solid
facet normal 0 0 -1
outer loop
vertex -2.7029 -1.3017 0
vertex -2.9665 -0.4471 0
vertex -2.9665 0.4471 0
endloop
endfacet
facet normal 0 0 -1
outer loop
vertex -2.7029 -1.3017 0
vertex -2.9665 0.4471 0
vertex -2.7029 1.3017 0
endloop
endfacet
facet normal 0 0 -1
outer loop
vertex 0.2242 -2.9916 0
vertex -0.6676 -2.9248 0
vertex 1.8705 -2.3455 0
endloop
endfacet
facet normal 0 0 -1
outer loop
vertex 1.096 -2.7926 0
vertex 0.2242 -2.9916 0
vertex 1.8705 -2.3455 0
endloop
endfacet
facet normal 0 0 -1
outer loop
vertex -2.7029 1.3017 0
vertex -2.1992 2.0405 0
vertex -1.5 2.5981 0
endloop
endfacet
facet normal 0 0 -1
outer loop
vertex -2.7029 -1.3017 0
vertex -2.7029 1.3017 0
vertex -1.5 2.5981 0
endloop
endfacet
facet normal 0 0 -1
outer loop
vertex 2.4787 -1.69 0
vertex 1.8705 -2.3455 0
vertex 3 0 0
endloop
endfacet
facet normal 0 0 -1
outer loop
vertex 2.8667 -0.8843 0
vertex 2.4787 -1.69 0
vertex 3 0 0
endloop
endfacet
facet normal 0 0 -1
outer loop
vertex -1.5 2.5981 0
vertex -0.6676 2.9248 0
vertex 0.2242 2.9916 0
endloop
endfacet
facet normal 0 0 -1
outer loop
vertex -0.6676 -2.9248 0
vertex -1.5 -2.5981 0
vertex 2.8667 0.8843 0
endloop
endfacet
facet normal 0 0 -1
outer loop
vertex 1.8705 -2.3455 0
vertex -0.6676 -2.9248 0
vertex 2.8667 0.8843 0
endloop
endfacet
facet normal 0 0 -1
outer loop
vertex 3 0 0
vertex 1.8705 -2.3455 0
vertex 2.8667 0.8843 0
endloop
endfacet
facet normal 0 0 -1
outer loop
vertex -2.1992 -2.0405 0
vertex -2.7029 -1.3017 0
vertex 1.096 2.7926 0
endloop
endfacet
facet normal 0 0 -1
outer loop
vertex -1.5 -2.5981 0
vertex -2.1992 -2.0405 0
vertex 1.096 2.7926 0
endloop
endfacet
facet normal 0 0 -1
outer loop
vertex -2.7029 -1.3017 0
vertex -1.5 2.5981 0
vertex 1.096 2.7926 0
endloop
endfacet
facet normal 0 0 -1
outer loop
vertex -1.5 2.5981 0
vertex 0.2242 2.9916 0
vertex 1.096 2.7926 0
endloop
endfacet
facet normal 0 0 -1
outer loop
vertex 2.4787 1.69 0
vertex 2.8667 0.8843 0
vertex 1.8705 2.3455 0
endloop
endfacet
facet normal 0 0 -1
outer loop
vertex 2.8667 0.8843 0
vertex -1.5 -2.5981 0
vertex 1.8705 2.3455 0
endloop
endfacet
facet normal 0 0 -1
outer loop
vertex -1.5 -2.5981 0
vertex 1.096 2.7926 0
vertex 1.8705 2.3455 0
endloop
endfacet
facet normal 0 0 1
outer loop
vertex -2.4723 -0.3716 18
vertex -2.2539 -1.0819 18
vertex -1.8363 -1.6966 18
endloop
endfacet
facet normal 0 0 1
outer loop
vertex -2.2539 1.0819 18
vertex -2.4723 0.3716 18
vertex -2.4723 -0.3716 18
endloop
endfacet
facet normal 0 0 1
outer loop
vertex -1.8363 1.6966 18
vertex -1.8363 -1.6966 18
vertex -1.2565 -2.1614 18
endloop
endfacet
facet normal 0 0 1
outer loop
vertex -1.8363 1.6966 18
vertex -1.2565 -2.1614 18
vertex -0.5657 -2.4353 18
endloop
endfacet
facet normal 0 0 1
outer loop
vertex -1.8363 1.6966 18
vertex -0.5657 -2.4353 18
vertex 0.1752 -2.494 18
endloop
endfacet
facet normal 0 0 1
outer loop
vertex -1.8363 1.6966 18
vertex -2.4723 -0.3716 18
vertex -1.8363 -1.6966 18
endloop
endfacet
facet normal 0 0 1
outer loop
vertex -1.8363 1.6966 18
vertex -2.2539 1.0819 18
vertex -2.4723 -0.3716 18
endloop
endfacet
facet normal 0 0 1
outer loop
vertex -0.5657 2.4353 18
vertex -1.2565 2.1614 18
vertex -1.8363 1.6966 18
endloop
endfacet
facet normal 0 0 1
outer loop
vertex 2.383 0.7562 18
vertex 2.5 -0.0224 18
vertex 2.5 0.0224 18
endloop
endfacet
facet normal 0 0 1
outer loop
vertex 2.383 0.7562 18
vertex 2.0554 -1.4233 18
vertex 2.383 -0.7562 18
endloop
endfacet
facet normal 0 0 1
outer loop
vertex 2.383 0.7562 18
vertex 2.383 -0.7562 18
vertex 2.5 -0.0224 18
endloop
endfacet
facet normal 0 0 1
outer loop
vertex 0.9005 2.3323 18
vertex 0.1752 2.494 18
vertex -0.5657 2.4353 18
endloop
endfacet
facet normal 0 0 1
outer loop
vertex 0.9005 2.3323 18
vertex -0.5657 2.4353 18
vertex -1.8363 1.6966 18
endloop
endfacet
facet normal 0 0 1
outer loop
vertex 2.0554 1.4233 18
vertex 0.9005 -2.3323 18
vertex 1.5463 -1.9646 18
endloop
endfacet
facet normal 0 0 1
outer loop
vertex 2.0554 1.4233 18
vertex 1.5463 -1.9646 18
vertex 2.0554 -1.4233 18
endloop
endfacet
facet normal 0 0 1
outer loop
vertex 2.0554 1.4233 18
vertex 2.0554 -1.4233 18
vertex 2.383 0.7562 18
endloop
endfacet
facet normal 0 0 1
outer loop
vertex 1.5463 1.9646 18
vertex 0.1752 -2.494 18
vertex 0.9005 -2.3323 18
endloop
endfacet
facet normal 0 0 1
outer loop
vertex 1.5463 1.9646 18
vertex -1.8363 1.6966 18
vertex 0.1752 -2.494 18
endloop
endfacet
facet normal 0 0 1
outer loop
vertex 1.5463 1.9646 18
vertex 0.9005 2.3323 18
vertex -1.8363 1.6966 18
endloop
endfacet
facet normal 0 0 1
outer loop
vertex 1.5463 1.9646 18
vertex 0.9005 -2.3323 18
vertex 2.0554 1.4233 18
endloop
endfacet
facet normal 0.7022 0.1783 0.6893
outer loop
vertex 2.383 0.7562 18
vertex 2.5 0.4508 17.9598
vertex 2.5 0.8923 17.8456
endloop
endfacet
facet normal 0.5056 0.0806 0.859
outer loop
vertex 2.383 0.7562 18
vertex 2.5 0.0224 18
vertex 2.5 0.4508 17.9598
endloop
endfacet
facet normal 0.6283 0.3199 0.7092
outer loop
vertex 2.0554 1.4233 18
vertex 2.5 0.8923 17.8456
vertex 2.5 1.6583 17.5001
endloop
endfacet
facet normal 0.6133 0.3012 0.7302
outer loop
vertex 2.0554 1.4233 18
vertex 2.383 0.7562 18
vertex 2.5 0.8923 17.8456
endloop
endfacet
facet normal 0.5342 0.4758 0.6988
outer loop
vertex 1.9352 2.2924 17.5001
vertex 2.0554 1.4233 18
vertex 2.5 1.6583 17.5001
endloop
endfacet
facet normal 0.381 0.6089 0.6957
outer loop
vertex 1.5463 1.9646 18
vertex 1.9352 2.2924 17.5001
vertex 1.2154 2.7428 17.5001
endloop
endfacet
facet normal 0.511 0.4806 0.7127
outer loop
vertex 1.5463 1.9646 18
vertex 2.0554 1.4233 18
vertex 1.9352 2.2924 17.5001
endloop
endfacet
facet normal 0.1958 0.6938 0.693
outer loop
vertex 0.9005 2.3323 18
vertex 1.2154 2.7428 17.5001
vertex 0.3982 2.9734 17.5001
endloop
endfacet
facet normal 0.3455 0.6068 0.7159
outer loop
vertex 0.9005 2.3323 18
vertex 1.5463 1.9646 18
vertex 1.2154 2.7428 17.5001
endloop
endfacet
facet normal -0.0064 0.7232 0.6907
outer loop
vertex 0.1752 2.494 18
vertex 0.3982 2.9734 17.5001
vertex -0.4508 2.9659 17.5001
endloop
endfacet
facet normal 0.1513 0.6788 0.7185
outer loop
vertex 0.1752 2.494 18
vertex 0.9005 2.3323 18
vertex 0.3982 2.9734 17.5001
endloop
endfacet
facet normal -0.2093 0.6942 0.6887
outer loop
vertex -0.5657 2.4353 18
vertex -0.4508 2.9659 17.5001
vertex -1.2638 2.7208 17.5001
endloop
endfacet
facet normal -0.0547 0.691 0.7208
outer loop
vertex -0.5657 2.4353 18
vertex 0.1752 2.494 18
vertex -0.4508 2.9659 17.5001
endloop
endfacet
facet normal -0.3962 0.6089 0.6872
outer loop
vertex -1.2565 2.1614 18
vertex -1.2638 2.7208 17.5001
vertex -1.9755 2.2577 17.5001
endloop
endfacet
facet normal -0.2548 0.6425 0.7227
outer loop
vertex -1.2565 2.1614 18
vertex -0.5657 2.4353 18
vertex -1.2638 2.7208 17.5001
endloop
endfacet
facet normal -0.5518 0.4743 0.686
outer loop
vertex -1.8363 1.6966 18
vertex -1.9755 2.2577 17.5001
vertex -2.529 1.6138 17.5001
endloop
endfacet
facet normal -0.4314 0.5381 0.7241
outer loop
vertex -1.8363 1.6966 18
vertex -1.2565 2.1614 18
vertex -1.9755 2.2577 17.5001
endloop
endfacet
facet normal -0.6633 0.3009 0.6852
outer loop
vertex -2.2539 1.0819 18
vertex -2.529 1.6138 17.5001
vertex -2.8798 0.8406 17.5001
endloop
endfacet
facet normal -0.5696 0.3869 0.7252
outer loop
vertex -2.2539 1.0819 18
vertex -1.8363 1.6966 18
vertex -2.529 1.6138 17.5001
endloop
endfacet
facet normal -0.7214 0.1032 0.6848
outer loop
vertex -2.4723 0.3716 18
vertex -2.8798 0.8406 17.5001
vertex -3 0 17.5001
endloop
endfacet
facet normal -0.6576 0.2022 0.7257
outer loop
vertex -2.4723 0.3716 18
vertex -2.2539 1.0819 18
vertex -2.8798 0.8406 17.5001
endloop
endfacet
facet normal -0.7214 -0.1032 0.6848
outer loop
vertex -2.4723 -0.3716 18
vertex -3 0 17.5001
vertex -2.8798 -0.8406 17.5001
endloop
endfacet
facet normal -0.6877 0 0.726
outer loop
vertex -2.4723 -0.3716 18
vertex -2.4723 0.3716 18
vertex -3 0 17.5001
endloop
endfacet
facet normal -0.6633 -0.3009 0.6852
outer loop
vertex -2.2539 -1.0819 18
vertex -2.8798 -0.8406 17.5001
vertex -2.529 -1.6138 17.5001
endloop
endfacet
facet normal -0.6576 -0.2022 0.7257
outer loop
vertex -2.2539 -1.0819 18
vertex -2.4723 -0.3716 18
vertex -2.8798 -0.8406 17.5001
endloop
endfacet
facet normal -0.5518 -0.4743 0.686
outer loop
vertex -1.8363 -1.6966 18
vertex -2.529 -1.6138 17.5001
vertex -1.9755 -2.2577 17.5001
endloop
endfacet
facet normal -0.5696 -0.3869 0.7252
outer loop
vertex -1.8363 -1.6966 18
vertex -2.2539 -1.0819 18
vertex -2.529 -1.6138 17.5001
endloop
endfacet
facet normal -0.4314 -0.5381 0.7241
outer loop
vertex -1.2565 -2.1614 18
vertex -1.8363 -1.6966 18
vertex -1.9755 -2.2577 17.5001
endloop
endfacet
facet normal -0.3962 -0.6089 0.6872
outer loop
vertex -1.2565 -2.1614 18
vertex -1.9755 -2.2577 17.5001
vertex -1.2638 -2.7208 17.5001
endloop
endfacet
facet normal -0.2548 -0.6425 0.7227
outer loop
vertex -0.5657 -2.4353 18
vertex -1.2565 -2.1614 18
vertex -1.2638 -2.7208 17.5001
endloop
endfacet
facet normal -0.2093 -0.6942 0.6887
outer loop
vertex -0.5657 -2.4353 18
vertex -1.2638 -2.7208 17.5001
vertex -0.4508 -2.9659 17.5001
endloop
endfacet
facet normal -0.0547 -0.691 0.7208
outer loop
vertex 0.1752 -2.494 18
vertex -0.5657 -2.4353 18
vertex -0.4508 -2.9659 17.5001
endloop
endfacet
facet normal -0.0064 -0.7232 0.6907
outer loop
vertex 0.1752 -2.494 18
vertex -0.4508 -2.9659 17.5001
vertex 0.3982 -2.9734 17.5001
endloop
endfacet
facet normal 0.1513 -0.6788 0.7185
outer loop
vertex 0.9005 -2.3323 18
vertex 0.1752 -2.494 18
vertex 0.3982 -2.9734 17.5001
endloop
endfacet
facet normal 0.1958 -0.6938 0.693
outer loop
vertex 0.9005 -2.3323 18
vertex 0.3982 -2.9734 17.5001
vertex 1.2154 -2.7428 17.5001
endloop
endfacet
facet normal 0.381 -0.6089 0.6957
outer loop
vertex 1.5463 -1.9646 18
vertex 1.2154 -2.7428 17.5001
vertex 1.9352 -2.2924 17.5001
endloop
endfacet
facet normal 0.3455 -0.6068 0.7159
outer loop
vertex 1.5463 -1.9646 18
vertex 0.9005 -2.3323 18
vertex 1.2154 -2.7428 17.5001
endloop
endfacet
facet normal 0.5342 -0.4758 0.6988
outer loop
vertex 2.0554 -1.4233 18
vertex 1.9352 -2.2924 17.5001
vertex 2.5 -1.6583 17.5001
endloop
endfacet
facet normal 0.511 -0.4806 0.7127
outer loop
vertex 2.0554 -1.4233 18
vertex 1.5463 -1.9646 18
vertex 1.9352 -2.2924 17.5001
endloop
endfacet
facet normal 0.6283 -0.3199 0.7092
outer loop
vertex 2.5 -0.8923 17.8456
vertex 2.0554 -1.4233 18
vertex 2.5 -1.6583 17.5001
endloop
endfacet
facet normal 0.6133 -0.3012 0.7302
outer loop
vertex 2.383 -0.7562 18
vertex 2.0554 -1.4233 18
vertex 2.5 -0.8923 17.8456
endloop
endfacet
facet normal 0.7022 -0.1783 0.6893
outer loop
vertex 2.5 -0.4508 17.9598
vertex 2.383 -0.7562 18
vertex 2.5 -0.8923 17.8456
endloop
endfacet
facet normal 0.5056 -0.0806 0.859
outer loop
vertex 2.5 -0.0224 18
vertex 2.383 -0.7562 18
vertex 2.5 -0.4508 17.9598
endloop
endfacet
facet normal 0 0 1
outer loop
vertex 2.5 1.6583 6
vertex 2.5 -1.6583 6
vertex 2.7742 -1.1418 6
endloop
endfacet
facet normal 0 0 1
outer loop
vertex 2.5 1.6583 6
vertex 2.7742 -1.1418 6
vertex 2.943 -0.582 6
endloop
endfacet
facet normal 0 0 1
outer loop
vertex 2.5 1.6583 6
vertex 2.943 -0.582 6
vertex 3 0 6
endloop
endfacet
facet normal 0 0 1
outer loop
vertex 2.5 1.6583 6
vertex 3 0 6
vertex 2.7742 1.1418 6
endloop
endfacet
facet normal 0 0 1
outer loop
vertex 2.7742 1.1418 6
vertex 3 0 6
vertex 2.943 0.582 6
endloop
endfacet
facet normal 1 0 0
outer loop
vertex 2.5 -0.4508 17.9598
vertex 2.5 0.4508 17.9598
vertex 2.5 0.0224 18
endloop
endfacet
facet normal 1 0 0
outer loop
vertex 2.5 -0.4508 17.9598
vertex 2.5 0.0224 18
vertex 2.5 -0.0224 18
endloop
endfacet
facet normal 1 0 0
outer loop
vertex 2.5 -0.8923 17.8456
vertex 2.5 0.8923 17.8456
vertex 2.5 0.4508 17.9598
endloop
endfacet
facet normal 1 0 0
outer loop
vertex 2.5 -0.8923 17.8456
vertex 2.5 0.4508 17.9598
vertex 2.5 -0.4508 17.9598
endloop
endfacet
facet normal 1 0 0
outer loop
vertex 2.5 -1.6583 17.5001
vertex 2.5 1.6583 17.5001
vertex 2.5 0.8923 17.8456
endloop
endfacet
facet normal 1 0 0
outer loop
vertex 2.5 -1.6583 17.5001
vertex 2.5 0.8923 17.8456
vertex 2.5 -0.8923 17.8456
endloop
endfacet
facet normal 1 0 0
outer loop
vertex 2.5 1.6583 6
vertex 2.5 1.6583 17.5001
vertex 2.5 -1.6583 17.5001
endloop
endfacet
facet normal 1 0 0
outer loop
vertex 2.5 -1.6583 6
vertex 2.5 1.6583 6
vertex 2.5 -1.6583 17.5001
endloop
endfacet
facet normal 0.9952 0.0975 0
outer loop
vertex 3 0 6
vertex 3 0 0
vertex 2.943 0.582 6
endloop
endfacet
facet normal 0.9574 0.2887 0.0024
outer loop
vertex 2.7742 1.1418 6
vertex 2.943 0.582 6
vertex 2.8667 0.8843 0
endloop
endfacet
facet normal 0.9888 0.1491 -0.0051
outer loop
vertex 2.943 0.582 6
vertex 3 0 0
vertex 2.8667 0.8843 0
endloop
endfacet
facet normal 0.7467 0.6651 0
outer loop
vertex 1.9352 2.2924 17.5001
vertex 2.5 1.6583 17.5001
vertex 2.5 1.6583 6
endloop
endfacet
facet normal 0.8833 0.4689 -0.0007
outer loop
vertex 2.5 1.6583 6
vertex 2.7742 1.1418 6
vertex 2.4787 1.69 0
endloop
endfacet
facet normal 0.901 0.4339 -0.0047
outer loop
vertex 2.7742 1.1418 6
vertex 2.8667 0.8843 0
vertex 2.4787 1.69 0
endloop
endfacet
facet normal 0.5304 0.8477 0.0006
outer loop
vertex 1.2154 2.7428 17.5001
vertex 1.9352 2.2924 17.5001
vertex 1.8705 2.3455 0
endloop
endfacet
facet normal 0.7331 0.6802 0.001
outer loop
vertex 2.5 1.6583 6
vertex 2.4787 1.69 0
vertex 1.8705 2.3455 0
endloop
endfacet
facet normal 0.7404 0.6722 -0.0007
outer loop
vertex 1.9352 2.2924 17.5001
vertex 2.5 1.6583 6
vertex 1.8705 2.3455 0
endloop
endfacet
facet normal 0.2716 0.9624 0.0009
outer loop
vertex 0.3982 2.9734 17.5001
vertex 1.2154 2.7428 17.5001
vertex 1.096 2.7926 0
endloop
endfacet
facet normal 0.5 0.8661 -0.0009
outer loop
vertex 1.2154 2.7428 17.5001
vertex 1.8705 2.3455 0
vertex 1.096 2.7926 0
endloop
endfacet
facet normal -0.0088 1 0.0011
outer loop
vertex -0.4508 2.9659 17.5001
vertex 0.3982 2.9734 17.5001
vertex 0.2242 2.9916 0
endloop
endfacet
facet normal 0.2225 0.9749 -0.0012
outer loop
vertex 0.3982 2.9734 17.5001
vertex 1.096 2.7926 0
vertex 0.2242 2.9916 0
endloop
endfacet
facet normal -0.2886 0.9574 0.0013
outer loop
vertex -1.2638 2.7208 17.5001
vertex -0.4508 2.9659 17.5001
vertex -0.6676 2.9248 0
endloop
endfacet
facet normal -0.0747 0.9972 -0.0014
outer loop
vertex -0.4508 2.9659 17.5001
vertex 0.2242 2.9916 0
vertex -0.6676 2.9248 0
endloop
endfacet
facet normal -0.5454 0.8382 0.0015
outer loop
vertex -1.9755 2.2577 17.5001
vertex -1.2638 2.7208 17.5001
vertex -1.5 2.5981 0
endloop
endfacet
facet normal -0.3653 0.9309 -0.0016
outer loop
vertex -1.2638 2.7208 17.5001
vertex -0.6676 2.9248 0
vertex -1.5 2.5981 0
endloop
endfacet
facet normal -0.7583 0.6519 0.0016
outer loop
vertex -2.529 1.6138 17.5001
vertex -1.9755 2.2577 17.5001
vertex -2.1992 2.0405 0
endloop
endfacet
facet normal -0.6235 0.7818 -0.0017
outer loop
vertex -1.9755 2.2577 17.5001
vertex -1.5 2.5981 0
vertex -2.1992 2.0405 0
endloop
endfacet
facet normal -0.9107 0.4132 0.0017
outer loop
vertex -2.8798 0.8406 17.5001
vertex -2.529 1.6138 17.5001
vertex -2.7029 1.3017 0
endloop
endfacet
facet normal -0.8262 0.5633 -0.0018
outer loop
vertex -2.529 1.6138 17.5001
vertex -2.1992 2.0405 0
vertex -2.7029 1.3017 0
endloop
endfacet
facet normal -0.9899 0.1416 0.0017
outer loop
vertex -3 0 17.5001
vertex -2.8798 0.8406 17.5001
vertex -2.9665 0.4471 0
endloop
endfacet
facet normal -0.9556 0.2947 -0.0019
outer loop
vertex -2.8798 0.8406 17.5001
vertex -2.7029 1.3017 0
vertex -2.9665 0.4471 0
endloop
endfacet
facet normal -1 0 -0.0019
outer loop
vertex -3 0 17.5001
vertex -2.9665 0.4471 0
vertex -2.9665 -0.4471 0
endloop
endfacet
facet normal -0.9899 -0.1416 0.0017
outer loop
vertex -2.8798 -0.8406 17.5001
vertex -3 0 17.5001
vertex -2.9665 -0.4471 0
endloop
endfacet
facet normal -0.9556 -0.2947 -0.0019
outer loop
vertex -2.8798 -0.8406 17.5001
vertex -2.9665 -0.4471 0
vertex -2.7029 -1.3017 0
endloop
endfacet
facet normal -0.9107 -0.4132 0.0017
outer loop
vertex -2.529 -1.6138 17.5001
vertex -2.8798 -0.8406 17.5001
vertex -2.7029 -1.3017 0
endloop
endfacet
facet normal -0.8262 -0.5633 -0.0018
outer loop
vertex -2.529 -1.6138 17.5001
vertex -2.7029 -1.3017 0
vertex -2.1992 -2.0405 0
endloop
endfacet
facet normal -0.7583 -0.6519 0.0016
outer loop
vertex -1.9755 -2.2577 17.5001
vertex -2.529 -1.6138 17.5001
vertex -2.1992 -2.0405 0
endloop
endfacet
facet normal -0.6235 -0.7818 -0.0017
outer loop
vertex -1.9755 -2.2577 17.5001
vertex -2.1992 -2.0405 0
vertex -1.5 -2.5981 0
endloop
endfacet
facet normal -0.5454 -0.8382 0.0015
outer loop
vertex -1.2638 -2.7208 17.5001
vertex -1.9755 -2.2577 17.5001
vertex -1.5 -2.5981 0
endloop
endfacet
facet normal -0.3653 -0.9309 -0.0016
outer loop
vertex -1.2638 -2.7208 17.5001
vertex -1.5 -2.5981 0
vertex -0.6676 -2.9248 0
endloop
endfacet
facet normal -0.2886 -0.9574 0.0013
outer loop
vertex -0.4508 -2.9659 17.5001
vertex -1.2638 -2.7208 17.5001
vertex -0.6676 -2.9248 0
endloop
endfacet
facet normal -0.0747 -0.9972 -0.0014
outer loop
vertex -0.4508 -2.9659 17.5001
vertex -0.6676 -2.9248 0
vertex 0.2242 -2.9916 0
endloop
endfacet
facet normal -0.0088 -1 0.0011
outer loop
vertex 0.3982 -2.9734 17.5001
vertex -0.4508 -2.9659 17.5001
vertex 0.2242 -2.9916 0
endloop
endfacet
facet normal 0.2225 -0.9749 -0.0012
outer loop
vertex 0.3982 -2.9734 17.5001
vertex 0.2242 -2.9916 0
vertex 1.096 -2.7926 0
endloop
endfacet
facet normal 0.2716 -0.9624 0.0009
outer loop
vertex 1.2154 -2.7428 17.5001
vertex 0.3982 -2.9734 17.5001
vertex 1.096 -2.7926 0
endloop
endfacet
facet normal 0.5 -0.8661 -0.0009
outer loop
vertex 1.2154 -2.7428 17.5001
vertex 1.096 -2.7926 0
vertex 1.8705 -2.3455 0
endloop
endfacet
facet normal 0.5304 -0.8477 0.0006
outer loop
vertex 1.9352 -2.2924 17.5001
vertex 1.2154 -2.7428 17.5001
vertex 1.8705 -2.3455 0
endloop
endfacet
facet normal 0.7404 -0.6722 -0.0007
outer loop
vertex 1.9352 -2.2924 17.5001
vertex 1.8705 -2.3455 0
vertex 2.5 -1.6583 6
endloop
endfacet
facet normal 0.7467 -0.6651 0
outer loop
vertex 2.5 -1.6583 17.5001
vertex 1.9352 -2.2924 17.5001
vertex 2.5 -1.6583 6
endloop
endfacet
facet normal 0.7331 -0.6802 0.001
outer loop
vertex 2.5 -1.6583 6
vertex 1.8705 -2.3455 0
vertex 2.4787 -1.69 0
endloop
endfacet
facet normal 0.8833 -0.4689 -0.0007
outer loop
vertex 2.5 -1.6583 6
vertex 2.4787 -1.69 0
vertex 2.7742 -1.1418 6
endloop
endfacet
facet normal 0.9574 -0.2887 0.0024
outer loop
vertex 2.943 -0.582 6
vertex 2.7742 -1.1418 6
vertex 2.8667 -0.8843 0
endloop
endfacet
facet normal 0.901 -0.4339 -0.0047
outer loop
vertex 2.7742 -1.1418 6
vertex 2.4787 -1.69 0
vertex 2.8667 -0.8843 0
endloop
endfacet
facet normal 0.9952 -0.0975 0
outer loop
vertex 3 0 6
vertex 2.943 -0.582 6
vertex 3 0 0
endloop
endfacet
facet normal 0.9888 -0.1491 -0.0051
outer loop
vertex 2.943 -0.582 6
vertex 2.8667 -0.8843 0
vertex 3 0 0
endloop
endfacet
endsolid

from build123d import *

# Parameters (mm, degrees)
SKETCH1_R           = 3
BOSS_EXTRUDE1_DEPTH = 18
CUT_EXTRUDE1_START  = -12
CUT_EXTRUDE1_DEPTH  = 12
CHAMFER1_SIZE       = 0.5


with BuildPart() as part:
    # Sketch1 → Boss-Extrude1 (new body)
    with BuildSketch(Plane.XY):
        Circle(SKETCH1_R)
    extrude(amount=BOSS_EXTRUDE1_DEPTH)

    # Sketch2 → Cut-Extrude1 (cut)
    with BuildSketch(Plane.XY.offset(18).offset(CUT_EXTRUDE1_START)):
        with BuildLine():
            Line((2.5, 1.658312395), (2.5, -1.658312395))
            ThreePointArc((2.5, -1.658312395), (3, 0), (2.5, 1.658312395))
        make_face()
    extrude(amount=CUT_EXTRUDE1_DEPTH, mode=Mode.SUBTRACT)

    # Chamfer1
    chamfer1_edges = [part.edges().sort_by_distance(p)[0] for p in [
        (-3, 0, 18),
    ]]
    chamfer(chamfer1_edges, length=CHAMFER1_SIZE - 0.0001)  # a hair under: the kernel refuses the full size


solid = part.part
